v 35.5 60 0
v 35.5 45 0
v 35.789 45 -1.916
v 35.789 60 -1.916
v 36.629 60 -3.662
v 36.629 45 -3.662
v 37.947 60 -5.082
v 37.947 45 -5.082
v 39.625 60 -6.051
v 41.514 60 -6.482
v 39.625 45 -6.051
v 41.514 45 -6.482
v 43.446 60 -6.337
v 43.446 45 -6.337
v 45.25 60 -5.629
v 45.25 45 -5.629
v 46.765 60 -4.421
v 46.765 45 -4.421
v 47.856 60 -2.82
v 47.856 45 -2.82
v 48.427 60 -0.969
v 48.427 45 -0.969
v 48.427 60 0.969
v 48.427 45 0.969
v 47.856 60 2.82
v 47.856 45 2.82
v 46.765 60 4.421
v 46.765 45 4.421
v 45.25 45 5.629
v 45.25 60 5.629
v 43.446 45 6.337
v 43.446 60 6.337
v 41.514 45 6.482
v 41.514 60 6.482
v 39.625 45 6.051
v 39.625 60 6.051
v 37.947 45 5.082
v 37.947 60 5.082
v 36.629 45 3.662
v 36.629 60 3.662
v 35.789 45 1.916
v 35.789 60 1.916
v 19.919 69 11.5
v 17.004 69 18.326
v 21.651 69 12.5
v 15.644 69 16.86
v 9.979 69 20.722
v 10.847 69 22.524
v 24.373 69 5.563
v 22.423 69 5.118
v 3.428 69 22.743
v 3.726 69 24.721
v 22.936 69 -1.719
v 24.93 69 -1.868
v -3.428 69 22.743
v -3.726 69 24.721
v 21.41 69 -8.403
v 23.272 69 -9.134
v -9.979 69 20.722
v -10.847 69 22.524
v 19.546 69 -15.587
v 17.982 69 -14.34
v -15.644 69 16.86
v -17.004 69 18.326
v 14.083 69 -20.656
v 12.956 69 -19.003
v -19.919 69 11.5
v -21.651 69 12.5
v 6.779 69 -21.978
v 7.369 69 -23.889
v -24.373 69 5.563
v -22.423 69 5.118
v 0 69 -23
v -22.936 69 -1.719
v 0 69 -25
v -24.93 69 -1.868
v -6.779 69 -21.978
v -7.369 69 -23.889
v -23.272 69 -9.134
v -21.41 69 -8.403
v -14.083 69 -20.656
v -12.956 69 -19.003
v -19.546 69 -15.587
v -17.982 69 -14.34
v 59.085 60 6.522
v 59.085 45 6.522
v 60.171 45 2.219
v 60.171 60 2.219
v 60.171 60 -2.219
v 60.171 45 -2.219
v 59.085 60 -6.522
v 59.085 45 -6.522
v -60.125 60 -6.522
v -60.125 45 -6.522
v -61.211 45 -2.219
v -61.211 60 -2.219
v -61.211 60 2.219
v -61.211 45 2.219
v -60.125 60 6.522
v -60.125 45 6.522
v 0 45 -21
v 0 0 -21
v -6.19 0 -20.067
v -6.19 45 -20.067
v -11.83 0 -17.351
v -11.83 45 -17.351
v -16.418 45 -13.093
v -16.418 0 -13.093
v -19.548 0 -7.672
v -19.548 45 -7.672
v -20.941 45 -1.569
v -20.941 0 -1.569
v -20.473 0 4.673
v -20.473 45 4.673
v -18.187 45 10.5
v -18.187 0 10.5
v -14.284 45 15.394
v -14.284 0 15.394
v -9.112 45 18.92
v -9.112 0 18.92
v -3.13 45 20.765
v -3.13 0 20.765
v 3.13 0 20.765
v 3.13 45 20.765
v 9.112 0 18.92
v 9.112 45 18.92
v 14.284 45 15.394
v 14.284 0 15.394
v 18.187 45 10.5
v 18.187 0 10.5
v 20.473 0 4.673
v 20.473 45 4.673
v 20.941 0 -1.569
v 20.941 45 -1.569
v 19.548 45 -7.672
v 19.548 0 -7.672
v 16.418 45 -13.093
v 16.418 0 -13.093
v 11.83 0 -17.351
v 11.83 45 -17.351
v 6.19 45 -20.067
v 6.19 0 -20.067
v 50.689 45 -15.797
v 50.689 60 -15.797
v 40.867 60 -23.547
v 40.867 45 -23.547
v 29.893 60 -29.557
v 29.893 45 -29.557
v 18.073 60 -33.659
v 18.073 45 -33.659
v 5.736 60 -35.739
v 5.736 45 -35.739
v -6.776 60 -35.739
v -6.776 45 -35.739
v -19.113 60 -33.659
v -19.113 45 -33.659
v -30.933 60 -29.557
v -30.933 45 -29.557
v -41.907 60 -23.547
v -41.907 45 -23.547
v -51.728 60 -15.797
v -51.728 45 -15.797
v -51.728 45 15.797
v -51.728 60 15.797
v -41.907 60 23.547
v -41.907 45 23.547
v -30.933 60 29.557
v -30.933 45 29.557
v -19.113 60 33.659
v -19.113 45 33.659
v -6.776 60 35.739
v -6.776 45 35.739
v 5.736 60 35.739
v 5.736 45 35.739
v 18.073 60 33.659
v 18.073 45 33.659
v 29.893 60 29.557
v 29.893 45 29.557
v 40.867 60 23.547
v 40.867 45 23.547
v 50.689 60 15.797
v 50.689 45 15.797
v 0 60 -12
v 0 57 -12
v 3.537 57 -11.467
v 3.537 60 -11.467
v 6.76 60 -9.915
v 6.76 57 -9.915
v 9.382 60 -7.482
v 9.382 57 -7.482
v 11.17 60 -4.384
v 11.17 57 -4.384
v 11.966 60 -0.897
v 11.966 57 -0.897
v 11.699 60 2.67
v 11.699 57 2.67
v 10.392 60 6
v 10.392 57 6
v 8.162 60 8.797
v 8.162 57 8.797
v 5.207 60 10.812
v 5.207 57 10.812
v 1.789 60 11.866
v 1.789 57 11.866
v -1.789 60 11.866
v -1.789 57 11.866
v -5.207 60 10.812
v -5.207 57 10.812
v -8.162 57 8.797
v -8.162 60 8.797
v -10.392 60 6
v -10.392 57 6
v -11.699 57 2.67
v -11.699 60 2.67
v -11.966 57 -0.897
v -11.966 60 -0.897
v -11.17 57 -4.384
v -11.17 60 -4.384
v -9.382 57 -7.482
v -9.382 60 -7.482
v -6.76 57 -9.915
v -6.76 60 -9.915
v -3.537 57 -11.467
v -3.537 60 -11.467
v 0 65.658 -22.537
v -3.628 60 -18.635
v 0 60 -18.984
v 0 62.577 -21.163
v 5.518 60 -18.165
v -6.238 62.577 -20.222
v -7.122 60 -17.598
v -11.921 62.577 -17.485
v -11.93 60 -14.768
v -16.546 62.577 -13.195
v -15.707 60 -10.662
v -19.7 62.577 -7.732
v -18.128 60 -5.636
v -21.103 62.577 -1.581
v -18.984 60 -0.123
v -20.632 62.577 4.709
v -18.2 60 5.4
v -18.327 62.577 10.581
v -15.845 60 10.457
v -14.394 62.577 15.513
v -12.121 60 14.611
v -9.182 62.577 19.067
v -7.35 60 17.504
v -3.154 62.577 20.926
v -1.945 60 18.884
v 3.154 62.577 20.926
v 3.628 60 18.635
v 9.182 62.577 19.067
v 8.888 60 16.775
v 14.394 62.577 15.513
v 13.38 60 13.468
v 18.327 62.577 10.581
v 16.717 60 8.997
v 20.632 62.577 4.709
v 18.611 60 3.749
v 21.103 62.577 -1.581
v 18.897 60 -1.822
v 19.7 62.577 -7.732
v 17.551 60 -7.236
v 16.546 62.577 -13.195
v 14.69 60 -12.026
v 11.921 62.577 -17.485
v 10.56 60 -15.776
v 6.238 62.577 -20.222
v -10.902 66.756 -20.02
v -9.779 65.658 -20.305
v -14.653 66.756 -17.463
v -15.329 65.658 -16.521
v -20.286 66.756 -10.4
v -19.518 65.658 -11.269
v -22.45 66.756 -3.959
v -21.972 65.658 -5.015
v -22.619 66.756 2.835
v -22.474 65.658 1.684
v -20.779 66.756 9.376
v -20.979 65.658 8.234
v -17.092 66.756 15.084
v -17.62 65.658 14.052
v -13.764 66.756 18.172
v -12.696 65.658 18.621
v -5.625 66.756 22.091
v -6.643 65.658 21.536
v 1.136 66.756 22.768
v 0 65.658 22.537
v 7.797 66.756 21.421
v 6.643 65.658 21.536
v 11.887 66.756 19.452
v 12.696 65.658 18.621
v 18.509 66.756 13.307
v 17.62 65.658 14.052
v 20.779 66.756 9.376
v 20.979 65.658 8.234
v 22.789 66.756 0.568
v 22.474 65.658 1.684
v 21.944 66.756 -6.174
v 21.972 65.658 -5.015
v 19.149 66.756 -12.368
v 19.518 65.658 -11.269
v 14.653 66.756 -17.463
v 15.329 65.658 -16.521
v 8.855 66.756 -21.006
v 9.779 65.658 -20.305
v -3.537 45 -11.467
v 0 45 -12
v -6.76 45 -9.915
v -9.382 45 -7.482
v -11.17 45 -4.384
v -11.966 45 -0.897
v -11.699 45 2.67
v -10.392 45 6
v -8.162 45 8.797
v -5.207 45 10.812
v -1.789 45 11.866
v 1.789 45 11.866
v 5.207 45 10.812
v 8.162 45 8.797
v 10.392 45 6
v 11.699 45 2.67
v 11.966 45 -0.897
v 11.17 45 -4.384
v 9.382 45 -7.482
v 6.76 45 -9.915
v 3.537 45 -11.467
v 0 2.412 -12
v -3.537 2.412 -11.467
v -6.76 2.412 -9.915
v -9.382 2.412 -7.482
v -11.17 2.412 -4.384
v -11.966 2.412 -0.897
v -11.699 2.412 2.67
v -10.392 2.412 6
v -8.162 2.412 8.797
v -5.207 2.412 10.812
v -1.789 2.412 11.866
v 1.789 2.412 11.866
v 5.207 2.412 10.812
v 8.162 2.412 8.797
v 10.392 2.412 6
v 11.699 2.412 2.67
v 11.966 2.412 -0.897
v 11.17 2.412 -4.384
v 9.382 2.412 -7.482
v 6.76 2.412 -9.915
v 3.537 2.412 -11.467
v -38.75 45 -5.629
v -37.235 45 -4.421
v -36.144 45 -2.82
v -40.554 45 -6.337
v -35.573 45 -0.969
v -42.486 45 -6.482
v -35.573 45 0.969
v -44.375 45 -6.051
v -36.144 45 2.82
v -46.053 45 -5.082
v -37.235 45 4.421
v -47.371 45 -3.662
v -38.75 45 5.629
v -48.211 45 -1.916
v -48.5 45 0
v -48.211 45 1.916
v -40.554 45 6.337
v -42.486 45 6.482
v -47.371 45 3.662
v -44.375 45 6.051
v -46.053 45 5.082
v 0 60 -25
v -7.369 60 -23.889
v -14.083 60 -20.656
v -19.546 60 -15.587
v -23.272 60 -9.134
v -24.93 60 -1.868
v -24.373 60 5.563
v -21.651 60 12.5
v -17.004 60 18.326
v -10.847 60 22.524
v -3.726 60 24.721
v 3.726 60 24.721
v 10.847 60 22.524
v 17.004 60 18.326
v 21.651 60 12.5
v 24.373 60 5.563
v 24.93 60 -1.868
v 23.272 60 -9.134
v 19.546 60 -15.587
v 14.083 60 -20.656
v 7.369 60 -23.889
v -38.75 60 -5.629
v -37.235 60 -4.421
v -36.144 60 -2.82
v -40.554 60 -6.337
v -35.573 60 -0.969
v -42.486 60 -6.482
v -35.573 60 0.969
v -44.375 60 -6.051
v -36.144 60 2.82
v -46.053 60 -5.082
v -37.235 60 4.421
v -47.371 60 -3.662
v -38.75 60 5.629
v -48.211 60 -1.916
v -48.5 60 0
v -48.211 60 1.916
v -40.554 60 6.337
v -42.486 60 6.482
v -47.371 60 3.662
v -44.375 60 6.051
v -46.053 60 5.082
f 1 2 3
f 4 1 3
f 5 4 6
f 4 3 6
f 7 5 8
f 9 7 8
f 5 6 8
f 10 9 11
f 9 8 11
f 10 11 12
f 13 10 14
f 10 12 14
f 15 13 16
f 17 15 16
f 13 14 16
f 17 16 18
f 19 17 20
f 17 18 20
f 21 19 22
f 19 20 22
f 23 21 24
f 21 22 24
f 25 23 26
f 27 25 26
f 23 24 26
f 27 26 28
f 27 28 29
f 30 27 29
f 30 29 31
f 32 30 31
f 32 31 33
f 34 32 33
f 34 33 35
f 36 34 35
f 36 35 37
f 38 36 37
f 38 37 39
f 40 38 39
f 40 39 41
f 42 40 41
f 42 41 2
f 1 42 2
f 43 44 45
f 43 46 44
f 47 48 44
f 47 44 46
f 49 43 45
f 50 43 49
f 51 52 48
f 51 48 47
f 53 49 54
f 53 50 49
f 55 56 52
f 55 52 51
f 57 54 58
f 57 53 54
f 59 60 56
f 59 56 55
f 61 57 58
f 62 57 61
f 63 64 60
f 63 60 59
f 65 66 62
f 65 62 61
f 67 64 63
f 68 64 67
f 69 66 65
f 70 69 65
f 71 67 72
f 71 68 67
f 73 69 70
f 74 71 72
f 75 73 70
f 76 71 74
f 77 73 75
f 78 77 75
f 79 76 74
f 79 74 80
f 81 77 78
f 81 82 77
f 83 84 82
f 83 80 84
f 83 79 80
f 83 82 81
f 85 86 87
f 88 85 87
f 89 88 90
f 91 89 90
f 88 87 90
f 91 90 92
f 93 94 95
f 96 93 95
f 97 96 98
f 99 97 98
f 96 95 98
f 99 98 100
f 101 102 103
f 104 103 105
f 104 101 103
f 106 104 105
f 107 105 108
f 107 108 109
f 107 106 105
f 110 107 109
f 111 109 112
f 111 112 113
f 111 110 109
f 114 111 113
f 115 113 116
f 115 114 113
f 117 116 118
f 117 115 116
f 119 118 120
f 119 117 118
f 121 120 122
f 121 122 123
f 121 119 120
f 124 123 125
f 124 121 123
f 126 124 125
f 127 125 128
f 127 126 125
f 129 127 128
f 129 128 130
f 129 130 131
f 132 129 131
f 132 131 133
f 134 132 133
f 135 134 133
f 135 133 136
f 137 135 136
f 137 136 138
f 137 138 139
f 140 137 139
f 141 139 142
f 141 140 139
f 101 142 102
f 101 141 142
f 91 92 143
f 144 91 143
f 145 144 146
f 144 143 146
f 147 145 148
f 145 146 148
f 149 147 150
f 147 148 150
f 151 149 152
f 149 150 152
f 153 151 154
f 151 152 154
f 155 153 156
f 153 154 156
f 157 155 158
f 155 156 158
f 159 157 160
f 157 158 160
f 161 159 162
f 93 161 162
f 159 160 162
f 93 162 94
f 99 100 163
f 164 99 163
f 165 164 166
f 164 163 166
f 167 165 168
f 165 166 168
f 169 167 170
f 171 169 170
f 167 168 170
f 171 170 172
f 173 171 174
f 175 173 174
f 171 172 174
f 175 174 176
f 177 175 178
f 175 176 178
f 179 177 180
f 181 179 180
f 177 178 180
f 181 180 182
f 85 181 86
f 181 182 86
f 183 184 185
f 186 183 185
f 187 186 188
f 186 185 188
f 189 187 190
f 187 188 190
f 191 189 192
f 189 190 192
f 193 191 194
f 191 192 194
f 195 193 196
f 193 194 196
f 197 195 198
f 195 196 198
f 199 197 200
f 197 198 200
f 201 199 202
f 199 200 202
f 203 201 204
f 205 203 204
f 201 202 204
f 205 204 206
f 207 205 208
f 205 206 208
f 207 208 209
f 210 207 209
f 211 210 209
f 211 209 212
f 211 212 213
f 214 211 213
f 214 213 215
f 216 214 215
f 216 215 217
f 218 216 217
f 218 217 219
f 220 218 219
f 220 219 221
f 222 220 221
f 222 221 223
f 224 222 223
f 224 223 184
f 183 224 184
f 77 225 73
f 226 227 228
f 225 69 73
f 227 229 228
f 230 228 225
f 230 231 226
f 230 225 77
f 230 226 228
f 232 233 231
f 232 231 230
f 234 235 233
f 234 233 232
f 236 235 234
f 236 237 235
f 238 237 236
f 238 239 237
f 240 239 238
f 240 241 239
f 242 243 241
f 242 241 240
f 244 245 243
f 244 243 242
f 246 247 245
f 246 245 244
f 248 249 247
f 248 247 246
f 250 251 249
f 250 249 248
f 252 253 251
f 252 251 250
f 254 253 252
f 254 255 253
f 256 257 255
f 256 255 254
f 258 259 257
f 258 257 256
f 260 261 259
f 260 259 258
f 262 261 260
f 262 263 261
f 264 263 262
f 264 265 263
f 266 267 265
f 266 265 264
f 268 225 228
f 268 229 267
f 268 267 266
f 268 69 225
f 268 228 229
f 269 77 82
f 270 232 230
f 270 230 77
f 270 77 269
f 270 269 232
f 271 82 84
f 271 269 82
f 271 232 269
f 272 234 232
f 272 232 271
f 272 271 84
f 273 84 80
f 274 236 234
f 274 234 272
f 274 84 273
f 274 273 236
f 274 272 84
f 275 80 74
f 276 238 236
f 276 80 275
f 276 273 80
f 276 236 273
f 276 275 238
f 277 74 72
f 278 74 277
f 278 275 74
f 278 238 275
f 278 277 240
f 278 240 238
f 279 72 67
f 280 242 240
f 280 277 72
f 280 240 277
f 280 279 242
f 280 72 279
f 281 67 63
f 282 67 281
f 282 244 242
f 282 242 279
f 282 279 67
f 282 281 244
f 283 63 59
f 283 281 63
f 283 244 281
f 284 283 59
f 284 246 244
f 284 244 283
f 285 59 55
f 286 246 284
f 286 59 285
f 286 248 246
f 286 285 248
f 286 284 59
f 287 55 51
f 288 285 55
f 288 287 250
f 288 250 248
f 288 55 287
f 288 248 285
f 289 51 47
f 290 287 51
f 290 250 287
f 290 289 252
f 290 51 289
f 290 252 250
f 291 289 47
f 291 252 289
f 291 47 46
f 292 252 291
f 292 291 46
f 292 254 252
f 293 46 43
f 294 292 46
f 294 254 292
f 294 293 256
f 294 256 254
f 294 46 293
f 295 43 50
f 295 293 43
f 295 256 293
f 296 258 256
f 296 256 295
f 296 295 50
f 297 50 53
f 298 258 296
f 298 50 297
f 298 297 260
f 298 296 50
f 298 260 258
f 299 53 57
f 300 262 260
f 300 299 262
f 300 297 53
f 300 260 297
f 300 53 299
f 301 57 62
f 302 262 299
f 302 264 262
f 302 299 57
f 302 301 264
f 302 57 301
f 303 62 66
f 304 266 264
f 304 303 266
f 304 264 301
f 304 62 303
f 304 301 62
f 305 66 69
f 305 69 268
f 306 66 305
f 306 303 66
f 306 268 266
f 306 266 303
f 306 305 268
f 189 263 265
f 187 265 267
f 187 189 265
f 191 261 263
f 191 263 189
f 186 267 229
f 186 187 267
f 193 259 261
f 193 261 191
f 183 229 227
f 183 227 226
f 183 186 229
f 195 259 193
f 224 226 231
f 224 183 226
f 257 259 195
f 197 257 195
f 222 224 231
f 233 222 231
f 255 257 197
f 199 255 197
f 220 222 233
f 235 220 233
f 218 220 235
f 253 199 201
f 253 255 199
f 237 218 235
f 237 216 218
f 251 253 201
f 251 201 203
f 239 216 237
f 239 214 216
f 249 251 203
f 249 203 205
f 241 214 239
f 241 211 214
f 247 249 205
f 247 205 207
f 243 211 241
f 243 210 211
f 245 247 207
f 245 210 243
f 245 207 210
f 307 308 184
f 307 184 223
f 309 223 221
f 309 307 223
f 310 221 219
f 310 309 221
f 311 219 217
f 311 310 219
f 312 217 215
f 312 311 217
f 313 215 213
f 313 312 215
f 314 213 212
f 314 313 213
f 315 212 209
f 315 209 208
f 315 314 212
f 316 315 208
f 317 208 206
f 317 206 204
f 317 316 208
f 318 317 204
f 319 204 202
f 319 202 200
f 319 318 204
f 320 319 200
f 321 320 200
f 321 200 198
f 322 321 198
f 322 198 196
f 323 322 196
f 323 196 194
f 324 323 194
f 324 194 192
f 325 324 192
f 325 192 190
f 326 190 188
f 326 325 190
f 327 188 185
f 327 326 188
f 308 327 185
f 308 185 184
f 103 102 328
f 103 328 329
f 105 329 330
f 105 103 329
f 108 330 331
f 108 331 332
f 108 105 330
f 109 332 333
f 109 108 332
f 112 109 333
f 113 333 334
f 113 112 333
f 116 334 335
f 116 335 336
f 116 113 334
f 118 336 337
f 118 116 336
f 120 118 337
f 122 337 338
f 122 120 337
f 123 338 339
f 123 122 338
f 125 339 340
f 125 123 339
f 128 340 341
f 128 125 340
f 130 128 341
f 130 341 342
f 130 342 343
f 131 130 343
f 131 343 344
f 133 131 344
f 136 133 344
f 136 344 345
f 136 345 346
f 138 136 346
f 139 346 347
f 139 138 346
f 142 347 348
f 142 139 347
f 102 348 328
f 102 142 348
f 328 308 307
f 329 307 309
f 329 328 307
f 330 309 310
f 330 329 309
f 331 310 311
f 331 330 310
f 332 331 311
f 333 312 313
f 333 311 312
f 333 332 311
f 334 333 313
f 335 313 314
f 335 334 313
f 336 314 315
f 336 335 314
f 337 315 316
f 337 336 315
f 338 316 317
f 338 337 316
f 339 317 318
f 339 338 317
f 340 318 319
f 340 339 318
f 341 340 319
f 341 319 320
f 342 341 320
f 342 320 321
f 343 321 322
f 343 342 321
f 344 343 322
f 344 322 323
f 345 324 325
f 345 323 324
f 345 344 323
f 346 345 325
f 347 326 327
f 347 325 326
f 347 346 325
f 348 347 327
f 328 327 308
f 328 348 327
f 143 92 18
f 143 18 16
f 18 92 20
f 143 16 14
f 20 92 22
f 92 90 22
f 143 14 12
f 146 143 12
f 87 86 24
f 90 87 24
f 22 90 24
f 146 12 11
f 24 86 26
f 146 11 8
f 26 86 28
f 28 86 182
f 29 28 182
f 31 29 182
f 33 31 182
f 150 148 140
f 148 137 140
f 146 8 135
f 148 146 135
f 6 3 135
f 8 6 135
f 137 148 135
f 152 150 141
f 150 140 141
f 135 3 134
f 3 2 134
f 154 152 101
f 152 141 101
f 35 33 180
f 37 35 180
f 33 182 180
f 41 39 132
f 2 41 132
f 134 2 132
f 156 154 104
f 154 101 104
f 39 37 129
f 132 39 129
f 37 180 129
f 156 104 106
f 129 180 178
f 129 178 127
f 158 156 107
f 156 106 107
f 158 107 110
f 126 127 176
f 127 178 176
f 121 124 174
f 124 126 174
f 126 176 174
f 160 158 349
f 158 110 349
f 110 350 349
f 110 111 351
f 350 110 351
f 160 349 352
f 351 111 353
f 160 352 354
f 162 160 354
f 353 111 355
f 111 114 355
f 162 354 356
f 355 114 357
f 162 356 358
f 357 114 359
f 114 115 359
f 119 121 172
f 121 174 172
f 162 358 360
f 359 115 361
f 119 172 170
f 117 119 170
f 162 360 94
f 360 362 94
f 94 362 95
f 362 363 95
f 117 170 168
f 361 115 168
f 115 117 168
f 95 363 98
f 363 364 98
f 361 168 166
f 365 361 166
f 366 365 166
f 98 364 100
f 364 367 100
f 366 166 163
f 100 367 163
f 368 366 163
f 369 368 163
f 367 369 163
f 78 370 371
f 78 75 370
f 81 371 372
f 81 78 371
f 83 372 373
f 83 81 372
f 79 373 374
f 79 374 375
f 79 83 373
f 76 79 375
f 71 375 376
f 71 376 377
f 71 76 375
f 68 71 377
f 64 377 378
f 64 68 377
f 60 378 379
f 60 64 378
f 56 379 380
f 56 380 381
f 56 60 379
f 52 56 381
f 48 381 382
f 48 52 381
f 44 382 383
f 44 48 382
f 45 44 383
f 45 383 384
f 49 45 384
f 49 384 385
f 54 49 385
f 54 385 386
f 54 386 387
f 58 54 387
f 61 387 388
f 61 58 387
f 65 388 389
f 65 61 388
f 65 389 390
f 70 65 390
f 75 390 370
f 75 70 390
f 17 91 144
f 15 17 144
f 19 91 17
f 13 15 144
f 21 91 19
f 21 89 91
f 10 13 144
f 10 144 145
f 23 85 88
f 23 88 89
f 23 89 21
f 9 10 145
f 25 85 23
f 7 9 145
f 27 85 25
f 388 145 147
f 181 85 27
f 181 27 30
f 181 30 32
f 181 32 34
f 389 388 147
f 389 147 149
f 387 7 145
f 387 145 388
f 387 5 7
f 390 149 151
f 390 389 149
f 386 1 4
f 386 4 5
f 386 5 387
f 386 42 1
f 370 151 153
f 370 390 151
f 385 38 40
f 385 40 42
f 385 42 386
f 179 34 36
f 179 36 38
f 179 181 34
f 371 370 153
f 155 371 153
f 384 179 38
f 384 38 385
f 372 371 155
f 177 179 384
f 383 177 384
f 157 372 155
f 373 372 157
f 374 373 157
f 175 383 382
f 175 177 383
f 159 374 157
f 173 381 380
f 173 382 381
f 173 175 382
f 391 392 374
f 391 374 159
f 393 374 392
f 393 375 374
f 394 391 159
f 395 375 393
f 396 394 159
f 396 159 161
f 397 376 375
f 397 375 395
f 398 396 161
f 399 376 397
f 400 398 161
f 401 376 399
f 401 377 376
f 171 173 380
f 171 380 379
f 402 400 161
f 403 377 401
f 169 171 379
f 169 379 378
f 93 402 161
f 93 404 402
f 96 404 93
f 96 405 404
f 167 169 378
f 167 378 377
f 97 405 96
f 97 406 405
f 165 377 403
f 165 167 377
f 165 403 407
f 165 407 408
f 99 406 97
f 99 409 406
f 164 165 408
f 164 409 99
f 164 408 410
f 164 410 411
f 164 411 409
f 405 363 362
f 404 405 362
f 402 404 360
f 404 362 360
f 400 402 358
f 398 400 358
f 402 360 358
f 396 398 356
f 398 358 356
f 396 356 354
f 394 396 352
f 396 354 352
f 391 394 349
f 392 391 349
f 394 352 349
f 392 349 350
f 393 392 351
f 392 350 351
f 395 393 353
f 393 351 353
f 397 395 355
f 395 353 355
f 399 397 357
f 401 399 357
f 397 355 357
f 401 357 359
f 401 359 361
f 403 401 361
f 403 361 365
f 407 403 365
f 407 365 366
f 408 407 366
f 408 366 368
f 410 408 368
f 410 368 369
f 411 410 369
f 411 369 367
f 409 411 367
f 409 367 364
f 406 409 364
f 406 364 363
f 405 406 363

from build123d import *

# Parameters (mm, degrees)
BOSS_EXTRUDE3_START        = 15
SKETCH2_R                  = 12
BOSS_EXTRUDE3_DEPTH        = 15
F_13_0_13_DIAMETER_HOLE1_D = 13


with BuildPart() as part:
    # Sketch1 → Revolve1 (revolve)
    with BuildSketch(Plane.XY, mode=Mode.PRIVATE) as revolve1_sk:
        with BuildLine():
            Line((12, 0), (21, 0))
            Line((21, 0), (21, 60))
            Line((21, 60), (25, 60))
            Line((25, 60), (25, 69))
            Line((25, 69), (23, 69))
            ThreePointArc((23, 69), (19.845922252, 60.849571269), (12, 57))
            Line((12, 57), (12, 0))
        make_face()
    revolve(revolve1_sk.sketch.rotate(Axis((0, 0, 0), (0, 1, 0)), 90), axis=Axis((0, 0, 0), (0, 1, 0)))

    # Sketch2 → Boss-Extrude3 (add)
    with BuildSketch(Plane.XZ.offset(-60).offset(BOSS_EXTRUDE3_START)):
        with BuildLine():
            ThreePointArc((-60.125231169, 6.521519783), (-0.519935794, 36), (59.08535958, 6.521519783))
            ThreePointArc((59.08535958, 6.521519783), (60.308298463, 0), (59.08535958, -6.521519783))
            ThreePointArc((59.08535958, -6.521519783), (-0.519935794, -36), (-60.125231169, -6.521519783))
            ThreePointArc((-60.125231169, -6.521519783), (-61.348170052, 0), (-60.125231169, 6.521519783))
        make_face()
        with Locations(Location((0, 0, 0), (0, 0, 270))):
            Circle(SKETCH2_R, mode=Mode.SUBTRACT)
    extrude(amount=-BOSS_EXTRUDE3_DEPTH)

    # Ø13.0 (13) Diameter Hole1 (through all)
    with Locations(Plane(origin=(0, 60, 0), x_dir=(1, 0, 0), z_dir=(0, 1, 0))):
        with Locations((-42, 0), (42, 0)):
            Hole(F_13_0_13_DIAMETER_HOLE1_D / 2)

    # Sketch6 → Cut-Revolve5 (revolve, cut)
    with BuildSketch(Plane.XY, mode=Mode.PRIVATE) as cut_revolve5_sk:
        Polygon((21, 0), (12, 0), (12, 2.411542732), align=None)
    revolve(cut_revolve5_sk.sketch.rotate(Axis((0, 0, 0), (0, 1, 0)), 90), axis=Axis((0, 0, 0), (0, 1, 0)), mode=Mode.SUBTRACT)


solid = part.part
